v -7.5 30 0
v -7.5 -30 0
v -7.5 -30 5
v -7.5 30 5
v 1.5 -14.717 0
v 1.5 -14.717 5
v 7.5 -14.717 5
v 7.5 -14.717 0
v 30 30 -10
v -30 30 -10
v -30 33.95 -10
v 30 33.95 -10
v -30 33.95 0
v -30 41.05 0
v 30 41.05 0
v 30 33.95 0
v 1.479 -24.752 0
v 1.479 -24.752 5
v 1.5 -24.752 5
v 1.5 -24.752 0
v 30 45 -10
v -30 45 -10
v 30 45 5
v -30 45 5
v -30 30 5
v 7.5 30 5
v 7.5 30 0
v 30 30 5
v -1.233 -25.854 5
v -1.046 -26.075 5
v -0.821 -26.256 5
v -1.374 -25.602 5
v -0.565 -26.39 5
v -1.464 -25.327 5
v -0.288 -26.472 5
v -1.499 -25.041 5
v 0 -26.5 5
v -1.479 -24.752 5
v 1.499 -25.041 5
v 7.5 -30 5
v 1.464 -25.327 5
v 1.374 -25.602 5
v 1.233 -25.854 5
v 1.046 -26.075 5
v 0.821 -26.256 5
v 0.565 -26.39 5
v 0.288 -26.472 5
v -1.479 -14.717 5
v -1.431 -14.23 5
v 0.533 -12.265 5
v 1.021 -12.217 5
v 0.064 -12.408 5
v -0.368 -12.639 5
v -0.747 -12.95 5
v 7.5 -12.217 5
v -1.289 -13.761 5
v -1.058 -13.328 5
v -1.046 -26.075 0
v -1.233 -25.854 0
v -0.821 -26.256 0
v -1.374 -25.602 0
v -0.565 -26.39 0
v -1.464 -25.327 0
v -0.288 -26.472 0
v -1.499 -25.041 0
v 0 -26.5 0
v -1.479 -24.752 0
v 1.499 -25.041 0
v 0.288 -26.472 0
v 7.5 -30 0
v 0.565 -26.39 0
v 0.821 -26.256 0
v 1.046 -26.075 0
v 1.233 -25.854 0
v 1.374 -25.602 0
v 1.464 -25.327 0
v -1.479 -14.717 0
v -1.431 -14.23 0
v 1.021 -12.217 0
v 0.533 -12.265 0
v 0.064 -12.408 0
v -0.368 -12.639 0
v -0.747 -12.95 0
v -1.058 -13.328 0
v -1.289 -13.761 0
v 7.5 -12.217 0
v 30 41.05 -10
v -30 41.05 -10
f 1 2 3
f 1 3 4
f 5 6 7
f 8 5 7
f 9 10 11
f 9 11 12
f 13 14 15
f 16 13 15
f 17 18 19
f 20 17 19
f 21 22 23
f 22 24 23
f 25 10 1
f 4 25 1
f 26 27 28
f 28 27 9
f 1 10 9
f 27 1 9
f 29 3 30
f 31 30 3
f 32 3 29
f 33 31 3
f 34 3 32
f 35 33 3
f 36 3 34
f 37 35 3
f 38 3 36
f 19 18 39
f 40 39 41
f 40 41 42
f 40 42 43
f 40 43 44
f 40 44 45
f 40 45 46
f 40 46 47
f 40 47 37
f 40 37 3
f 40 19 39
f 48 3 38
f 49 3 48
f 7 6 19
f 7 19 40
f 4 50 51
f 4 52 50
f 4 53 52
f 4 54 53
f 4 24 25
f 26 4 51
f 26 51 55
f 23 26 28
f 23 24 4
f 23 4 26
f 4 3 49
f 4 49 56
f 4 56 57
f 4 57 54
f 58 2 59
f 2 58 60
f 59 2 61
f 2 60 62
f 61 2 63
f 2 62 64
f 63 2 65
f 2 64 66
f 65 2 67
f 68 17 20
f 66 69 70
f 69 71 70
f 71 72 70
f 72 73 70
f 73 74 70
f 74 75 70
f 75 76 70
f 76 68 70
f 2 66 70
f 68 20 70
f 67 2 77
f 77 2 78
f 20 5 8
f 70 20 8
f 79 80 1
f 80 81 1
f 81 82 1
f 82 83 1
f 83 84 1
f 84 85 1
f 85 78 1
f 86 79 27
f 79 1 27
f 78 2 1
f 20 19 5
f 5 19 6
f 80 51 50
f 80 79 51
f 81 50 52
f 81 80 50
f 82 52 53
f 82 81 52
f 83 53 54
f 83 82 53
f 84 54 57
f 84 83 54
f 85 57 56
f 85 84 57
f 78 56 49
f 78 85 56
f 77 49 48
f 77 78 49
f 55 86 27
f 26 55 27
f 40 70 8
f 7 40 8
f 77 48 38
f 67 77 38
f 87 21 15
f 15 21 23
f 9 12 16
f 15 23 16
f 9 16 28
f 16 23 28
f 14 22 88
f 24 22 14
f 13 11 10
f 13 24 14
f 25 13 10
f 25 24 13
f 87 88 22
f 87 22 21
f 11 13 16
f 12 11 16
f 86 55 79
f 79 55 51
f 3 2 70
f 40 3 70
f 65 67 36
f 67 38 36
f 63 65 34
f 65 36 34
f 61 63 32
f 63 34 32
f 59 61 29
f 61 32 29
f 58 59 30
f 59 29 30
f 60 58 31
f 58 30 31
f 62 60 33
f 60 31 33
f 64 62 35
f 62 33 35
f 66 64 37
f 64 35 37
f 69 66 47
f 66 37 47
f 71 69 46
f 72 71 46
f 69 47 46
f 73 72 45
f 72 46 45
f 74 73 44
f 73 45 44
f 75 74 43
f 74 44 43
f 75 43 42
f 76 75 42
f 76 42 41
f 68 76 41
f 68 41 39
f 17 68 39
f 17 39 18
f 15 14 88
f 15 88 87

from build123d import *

# Parameters (mm, degrees)
F0_W     = 15
F0_H     = 60
F1_DEPTH = 5
F2_W     = 60
F2_H     = 15
F3_DEPTH = 5
F4_W     = 60
F4_H     = 3.95
F5_DEPTH = 10
F6_R     = 1.5
F7_DEPTH = 25
F9_DEPTH = 25
F10_R    = 2.5


with BuildPart() as f1:
    # F0 (on Top) → F1 (new body)
    with BuildSketch(Plane.XY):
        Rectangle(F0_W, F0_H)
    extrude(amount=F1_DEPTH)

    # F2 (on Top) → F3 (join)
    with BuildSketch(Plane.XY):
        with Locations((0, 37.5)):
            Rectangle(F2_W, F2_H)
    extrude(amount=F3_DEPTH)

    # F4 (on face) → F5 (join)
    with BuildSketch(Plane(origin=(0, 0, 0), x_dir=(1, 0, 0), z_dir=(0, 0, -1))):
        with Locations((0, -43.025)):
            Rectangle(F4_W, F4_H)
        with Locations((0, -31.975)):
            Rectangle(F4_W, F4_H)
    extrude(amount=F5_DEPTH)

    # F6 (on face) → F7 (cut)
    with BuildSketch(Plane.XY.offset(5)):
        with Locations((0, -25)):
            Circle(F6_R)
    extrude(amount=-F7_DEPTH, mode=Mode.SUBTRACT)

    # F8 (on face) → F9 (cut)
    with BuildSketch(Plane.XY.offset(5)):
        with BuildLine():
            Line((-1.47942, -12.217379), (-1.47942, -24.752378))
            ThreePointArc((-1.47942, -24.752378), (0, -23.5), (1.47942, -24.752378))
            Line((1.47942, -24.752378), (1.5, -24.752378))
            Line((1.5, -24.752378), (1.5, -14.717379))
            Line((1.5, -14.717379), (7.5, -14.717379))
            Line((7.5, -14.717379), (7.5, -12.217379))
            Line((7.5, -12.217379), (-1.47942, -12.217379))
        make_face()
    extrude(amount=-F9_DEPTH, mode=Mode.SUBTRACT)

    # F10
    f10_edges = [f1.edges().sort_by_distance(p)[0] for p in [
        (-1.47942, -12.217379, 2.5),
    ]]
    fillet(f10_edges, radius=F10_R)


solid = f1.part
